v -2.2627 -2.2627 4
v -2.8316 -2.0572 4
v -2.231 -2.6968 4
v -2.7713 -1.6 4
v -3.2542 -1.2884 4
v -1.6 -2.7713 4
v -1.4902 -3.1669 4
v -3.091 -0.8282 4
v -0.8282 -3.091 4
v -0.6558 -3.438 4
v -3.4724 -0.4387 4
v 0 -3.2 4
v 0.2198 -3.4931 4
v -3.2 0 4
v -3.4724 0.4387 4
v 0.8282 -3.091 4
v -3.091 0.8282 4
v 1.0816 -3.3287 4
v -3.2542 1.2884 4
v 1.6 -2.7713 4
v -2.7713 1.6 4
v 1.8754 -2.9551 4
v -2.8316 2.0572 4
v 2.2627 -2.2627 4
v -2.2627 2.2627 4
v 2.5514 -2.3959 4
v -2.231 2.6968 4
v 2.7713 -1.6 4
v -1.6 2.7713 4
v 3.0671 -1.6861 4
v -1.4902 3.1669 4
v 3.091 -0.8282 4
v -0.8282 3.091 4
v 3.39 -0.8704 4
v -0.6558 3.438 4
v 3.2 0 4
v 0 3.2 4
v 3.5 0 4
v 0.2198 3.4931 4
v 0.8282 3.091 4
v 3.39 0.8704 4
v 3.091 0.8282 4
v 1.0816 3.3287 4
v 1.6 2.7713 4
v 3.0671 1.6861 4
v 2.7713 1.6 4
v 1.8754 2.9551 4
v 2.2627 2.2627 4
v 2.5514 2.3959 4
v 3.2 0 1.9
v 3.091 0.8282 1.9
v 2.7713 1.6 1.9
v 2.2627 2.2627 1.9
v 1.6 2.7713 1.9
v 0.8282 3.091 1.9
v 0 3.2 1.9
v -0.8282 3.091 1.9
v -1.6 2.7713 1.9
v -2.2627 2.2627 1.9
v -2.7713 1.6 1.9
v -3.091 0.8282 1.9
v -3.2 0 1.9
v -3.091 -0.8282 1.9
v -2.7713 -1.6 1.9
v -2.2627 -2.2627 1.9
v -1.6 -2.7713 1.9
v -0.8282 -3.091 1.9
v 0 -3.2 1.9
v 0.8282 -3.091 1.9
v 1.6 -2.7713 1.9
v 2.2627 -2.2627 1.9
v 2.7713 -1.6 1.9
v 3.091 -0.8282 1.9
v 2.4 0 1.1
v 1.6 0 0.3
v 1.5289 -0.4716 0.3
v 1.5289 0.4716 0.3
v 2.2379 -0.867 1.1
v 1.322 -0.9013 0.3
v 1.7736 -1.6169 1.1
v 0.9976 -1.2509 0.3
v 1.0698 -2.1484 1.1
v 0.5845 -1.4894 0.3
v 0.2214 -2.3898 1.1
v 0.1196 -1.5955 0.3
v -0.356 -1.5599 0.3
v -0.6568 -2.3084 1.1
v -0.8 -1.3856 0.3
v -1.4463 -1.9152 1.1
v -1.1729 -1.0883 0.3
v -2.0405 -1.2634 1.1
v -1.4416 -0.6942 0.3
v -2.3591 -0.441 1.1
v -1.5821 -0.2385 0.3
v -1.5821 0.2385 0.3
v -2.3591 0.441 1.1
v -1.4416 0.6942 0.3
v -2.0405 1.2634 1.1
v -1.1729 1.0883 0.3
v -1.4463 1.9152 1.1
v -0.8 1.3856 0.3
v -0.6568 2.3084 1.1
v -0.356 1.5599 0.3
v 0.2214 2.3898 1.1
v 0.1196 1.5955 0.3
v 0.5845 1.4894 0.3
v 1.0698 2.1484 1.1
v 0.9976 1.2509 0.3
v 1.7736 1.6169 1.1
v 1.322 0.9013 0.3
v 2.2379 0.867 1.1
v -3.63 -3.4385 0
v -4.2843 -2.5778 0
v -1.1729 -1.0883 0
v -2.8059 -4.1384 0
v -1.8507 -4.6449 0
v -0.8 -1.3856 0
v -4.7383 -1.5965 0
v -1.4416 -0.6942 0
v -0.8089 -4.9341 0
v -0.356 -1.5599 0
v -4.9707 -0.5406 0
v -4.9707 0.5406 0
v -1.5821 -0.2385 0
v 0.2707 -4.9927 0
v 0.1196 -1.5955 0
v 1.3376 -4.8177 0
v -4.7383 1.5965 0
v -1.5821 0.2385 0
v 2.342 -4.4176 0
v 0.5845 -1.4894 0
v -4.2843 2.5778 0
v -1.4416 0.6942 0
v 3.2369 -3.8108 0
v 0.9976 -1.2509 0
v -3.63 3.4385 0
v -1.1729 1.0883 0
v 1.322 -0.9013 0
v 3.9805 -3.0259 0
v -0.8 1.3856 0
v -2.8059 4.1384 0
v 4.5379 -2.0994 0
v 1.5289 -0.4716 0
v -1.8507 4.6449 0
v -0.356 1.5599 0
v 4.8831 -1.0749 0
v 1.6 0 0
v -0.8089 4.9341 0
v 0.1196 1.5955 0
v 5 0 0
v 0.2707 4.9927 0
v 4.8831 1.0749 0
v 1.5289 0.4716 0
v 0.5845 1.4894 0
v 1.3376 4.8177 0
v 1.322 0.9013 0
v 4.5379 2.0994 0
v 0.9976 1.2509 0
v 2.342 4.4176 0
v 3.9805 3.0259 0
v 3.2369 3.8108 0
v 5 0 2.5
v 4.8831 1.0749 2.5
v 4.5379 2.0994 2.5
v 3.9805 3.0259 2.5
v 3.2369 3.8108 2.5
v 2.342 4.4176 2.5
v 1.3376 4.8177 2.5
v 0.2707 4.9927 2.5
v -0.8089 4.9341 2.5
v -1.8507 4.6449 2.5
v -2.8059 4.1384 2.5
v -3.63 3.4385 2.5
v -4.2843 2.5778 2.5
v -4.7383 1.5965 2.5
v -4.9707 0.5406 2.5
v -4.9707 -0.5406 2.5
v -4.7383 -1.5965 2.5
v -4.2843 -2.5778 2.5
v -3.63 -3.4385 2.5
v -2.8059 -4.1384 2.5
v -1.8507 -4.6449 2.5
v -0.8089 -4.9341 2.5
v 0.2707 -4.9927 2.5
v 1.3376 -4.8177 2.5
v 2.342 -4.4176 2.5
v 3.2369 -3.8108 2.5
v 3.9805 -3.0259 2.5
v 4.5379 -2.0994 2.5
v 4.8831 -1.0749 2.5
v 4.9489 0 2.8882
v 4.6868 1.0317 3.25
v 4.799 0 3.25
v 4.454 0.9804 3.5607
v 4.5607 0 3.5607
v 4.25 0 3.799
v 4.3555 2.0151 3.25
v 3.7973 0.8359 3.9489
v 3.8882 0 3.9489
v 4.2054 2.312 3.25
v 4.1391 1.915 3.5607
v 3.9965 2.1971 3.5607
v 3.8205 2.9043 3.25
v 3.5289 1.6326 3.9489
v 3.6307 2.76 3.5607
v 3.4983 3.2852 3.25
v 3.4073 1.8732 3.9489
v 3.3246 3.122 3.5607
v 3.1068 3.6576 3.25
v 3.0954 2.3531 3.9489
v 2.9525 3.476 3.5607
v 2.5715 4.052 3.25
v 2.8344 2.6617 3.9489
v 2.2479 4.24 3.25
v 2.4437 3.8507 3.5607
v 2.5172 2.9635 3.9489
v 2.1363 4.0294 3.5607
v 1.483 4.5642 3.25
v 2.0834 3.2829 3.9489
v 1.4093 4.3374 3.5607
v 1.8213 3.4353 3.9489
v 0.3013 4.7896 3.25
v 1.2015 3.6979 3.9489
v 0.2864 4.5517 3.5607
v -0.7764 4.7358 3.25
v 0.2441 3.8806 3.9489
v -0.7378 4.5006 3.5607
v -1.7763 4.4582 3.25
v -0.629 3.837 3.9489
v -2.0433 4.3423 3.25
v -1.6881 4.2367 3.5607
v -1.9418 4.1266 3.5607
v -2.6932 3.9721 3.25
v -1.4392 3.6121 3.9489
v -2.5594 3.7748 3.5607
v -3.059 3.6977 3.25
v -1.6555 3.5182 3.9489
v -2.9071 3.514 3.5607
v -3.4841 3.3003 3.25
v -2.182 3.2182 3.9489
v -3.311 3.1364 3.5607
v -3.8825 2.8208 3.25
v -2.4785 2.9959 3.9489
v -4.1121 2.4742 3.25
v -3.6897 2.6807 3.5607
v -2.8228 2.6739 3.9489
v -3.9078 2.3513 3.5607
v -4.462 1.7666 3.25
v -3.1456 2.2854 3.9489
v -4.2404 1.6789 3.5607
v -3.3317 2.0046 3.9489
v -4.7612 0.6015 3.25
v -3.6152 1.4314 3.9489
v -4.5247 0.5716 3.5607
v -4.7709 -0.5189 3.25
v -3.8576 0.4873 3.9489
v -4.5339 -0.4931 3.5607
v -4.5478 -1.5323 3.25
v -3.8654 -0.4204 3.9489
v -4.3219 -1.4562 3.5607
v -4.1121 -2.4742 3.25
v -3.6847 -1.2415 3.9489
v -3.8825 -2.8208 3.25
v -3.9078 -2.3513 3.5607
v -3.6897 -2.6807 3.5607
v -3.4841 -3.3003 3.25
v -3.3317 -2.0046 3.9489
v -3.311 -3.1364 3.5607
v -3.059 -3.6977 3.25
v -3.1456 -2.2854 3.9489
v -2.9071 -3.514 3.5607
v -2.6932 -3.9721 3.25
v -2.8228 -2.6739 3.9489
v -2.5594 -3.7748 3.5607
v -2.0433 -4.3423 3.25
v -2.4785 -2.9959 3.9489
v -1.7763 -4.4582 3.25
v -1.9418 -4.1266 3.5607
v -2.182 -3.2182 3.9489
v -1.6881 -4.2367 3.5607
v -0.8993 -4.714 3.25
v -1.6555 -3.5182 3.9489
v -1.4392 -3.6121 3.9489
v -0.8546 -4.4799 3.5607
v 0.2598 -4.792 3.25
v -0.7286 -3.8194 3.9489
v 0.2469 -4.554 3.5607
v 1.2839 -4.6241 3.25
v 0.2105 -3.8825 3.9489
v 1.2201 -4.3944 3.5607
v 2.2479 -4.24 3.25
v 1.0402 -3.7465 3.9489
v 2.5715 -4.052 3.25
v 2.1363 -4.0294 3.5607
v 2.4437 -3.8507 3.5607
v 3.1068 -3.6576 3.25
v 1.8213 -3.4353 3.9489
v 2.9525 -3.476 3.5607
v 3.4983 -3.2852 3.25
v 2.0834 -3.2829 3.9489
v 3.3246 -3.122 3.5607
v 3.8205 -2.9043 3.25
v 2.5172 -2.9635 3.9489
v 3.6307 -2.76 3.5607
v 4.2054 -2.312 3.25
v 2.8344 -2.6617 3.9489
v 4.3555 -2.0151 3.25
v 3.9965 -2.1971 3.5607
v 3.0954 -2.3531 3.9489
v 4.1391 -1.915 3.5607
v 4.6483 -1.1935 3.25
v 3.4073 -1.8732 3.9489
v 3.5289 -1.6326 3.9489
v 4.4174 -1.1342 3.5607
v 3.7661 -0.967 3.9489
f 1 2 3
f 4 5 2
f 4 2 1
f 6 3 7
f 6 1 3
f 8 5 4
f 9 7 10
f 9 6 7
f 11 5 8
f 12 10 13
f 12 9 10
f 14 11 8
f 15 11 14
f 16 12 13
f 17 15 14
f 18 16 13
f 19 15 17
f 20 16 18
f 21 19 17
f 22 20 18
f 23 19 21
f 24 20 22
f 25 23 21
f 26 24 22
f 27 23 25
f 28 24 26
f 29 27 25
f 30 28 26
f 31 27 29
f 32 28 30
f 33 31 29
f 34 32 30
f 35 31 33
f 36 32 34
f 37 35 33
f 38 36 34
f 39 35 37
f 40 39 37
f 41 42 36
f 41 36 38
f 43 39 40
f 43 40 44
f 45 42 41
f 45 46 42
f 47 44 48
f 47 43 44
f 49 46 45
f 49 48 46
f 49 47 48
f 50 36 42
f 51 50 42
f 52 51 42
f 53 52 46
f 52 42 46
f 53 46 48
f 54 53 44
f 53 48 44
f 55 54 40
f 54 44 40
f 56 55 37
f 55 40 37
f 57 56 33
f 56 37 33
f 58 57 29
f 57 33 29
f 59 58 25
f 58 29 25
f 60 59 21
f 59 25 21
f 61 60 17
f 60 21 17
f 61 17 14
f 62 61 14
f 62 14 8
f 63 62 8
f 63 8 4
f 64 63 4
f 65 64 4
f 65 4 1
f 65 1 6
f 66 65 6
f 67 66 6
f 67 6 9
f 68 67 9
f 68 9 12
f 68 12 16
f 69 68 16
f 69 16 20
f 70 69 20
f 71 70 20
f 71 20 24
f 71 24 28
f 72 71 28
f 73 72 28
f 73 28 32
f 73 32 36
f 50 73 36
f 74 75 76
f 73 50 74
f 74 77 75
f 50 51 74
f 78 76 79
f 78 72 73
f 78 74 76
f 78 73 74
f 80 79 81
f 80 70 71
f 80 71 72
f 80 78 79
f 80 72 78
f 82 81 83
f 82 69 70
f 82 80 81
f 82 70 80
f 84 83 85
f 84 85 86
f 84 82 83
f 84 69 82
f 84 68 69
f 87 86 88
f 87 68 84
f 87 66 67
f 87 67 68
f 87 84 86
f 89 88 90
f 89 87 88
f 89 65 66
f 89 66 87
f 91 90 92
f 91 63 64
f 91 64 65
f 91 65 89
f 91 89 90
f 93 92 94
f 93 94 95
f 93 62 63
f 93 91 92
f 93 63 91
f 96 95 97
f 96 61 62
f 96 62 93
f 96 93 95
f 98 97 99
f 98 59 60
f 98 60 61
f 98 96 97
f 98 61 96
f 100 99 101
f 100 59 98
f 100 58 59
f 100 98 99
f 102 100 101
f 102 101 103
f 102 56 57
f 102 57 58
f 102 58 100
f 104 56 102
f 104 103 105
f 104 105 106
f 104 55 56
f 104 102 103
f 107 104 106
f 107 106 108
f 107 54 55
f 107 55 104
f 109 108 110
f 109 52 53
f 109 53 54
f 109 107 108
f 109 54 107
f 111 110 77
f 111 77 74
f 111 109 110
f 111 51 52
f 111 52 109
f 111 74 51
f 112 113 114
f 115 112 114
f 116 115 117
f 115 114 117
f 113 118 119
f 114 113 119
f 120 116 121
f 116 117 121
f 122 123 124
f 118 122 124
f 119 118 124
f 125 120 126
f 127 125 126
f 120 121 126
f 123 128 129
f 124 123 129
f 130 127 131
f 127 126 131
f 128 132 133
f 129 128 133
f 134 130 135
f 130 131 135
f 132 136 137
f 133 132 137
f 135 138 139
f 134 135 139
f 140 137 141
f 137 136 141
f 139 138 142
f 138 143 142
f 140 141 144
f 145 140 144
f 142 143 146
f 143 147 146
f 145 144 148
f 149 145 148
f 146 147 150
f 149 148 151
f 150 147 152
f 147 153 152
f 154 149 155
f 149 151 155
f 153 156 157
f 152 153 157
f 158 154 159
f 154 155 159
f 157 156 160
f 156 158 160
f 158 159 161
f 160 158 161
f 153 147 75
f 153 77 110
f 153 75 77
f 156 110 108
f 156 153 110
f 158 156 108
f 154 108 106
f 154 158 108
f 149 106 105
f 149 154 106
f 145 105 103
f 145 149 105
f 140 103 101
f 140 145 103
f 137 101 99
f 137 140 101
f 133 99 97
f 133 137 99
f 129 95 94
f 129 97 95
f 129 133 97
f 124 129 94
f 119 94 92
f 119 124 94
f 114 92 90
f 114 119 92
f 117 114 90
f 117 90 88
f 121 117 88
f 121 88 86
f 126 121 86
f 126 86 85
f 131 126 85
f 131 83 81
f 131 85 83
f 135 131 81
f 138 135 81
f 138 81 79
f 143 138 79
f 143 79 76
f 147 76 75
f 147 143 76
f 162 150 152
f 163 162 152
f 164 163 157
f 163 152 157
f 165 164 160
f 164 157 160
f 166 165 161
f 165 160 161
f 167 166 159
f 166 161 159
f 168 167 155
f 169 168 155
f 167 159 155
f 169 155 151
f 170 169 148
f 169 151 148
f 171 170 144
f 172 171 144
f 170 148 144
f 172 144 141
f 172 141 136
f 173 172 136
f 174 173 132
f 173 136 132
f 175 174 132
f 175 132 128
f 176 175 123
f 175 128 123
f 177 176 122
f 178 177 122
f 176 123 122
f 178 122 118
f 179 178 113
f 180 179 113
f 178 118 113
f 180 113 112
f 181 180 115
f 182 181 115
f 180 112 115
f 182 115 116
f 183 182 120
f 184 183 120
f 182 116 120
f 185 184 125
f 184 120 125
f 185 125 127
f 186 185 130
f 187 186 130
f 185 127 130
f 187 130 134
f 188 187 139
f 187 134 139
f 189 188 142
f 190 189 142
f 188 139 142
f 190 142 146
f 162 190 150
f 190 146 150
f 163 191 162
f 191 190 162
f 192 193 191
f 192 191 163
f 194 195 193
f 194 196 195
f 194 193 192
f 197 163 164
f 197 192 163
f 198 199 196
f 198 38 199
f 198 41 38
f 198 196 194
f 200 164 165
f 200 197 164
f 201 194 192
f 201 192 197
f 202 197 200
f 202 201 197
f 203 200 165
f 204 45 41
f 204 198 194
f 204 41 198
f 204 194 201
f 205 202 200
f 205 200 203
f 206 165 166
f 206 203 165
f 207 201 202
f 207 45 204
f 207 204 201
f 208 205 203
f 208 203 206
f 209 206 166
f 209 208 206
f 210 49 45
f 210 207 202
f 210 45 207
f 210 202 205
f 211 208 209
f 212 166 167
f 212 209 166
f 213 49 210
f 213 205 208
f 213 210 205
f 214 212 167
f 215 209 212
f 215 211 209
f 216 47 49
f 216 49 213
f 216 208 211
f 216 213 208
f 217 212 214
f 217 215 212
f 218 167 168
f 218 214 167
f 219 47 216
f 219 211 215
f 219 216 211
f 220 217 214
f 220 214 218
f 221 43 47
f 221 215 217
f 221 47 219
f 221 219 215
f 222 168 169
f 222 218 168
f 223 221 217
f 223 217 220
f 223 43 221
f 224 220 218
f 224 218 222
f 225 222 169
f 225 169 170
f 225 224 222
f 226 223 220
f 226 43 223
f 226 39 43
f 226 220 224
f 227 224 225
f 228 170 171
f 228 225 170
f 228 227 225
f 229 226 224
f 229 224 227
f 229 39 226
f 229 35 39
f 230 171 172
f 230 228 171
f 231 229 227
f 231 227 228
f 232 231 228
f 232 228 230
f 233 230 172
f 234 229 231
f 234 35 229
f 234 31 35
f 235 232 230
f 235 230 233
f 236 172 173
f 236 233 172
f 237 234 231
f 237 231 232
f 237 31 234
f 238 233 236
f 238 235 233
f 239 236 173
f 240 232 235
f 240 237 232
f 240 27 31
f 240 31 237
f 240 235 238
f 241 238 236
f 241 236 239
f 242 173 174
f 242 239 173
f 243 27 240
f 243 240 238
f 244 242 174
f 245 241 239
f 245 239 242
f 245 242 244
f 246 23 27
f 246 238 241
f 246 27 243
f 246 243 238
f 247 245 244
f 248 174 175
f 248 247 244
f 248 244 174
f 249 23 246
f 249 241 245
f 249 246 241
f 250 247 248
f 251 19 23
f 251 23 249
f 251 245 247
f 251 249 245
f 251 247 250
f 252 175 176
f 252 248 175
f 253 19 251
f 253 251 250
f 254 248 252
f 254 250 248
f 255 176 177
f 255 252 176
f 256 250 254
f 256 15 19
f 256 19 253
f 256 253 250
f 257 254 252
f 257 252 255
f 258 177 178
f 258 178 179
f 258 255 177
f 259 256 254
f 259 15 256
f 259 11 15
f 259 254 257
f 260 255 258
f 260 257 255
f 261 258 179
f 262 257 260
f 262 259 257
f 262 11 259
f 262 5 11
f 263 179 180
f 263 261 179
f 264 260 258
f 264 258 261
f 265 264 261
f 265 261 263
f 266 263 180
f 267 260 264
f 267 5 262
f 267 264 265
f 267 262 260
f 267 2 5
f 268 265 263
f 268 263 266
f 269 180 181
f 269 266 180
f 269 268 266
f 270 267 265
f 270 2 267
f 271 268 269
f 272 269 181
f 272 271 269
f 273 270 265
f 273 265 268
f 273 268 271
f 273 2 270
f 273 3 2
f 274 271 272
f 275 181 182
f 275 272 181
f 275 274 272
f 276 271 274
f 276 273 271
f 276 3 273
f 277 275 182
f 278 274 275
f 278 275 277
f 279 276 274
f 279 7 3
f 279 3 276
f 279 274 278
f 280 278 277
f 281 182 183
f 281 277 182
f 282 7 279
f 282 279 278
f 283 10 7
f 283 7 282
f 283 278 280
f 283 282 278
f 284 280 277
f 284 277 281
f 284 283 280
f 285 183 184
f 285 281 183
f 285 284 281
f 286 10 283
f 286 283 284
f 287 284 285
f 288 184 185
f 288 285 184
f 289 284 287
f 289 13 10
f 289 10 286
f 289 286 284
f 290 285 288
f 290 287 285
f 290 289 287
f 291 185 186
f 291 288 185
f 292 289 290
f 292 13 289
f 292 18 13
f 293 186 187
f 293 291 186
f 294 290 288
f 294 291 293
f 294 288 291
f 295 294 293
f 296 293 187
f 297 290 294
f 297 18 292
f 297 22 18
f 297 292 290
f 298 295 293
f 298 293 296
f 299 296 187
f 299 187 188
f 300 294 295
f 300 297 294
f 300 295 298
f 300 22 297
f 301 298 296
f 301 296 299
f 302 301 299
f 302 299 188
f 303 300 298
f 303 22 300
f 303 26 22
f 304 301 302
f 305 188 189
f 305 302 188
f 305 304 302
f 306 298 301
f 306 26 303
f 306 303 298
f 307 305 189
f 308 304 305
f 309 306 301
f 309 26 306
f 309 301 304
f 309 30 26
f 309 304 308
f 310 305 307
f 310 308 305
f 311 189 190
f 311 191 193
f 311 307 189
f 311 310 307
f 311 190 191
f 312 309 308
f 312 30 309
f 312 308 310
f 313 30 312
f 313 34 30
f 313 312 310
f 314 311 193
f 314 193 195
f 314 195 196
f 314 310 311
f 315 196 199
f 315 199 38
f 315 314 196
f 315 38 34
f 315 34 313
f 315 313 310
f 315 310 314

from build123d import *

# Parameters (mm, degrees)
SKETCH1_R           = 5
SKETCH1_R_2         = 1.6
BOSS_EXTRUDE1_DEPTH = 4
SKETCH2_R           = 3.2
CUT_EXTRUDE1_DEPTH  = 1.9
CHAMFER1_SIZE       = 1.8
FILLET1_R           = 1.5


with BuildPart() as part:
    # Sketch1 → Boss-Extrude1 (new body)
    with BuildSketch(Plane.XY):
        Circle(SKETCH1_R)
        Circle(SKETCH1_R_2, mode=Mode.SUBTRACT)
    extrude(amount=BOSS_EXTRUDE1_DEPTH)

    # Sketch2 → Cut-Extrude1 (cut)
    with BuildSketch(Plane.XY.offset(4)):
        Circle(SKETCH2_R)
    extrude(amount=-CUT_EXTRUDE1_DEPTH, mode=Mode.SUBTRACT)

    # Chamfer1
    # the kernel refuses this chamfer: 1.8 mm, written as the material it takes off along each edge
    with BuildSketch(Plane(origin=(0, 0, 2.1), x_dir=(1, 0, 0), z_dir=(0, 1, 0))) as chamfer1_piece_1_section:
        Polygon((1.6, CHAMFER1_SIZE), (1.6 + CHAMFER1_SIZE, 0), (1.6, 0), align=None)
    chamfer1_piece_1 = revolve(axis=Axis((0, 0, 2.1), (0, 0, -1)), mode=Mode.PRIVATE)
    chamfer1_piece_1 = chamfer1_piece_1 & Plane(origin=(0, 0, 1.094879123), x_dir=(1, 0, 0), z_dir=(0, 0, 1)) * Cylinder(3.2, 14, mode=Mode.PRIVATE)
    add(chamfer1_piece_1, mode=Mode.SUBTRACT)

    # Fillet1
    fillet1_edges = [part.edges().sort_by_distance(p)[0] for p in [
        (-5, 0, 4),
    ]]
    fillet(fillet1_edges, radius=FILLET1_R)


solid = part.part
